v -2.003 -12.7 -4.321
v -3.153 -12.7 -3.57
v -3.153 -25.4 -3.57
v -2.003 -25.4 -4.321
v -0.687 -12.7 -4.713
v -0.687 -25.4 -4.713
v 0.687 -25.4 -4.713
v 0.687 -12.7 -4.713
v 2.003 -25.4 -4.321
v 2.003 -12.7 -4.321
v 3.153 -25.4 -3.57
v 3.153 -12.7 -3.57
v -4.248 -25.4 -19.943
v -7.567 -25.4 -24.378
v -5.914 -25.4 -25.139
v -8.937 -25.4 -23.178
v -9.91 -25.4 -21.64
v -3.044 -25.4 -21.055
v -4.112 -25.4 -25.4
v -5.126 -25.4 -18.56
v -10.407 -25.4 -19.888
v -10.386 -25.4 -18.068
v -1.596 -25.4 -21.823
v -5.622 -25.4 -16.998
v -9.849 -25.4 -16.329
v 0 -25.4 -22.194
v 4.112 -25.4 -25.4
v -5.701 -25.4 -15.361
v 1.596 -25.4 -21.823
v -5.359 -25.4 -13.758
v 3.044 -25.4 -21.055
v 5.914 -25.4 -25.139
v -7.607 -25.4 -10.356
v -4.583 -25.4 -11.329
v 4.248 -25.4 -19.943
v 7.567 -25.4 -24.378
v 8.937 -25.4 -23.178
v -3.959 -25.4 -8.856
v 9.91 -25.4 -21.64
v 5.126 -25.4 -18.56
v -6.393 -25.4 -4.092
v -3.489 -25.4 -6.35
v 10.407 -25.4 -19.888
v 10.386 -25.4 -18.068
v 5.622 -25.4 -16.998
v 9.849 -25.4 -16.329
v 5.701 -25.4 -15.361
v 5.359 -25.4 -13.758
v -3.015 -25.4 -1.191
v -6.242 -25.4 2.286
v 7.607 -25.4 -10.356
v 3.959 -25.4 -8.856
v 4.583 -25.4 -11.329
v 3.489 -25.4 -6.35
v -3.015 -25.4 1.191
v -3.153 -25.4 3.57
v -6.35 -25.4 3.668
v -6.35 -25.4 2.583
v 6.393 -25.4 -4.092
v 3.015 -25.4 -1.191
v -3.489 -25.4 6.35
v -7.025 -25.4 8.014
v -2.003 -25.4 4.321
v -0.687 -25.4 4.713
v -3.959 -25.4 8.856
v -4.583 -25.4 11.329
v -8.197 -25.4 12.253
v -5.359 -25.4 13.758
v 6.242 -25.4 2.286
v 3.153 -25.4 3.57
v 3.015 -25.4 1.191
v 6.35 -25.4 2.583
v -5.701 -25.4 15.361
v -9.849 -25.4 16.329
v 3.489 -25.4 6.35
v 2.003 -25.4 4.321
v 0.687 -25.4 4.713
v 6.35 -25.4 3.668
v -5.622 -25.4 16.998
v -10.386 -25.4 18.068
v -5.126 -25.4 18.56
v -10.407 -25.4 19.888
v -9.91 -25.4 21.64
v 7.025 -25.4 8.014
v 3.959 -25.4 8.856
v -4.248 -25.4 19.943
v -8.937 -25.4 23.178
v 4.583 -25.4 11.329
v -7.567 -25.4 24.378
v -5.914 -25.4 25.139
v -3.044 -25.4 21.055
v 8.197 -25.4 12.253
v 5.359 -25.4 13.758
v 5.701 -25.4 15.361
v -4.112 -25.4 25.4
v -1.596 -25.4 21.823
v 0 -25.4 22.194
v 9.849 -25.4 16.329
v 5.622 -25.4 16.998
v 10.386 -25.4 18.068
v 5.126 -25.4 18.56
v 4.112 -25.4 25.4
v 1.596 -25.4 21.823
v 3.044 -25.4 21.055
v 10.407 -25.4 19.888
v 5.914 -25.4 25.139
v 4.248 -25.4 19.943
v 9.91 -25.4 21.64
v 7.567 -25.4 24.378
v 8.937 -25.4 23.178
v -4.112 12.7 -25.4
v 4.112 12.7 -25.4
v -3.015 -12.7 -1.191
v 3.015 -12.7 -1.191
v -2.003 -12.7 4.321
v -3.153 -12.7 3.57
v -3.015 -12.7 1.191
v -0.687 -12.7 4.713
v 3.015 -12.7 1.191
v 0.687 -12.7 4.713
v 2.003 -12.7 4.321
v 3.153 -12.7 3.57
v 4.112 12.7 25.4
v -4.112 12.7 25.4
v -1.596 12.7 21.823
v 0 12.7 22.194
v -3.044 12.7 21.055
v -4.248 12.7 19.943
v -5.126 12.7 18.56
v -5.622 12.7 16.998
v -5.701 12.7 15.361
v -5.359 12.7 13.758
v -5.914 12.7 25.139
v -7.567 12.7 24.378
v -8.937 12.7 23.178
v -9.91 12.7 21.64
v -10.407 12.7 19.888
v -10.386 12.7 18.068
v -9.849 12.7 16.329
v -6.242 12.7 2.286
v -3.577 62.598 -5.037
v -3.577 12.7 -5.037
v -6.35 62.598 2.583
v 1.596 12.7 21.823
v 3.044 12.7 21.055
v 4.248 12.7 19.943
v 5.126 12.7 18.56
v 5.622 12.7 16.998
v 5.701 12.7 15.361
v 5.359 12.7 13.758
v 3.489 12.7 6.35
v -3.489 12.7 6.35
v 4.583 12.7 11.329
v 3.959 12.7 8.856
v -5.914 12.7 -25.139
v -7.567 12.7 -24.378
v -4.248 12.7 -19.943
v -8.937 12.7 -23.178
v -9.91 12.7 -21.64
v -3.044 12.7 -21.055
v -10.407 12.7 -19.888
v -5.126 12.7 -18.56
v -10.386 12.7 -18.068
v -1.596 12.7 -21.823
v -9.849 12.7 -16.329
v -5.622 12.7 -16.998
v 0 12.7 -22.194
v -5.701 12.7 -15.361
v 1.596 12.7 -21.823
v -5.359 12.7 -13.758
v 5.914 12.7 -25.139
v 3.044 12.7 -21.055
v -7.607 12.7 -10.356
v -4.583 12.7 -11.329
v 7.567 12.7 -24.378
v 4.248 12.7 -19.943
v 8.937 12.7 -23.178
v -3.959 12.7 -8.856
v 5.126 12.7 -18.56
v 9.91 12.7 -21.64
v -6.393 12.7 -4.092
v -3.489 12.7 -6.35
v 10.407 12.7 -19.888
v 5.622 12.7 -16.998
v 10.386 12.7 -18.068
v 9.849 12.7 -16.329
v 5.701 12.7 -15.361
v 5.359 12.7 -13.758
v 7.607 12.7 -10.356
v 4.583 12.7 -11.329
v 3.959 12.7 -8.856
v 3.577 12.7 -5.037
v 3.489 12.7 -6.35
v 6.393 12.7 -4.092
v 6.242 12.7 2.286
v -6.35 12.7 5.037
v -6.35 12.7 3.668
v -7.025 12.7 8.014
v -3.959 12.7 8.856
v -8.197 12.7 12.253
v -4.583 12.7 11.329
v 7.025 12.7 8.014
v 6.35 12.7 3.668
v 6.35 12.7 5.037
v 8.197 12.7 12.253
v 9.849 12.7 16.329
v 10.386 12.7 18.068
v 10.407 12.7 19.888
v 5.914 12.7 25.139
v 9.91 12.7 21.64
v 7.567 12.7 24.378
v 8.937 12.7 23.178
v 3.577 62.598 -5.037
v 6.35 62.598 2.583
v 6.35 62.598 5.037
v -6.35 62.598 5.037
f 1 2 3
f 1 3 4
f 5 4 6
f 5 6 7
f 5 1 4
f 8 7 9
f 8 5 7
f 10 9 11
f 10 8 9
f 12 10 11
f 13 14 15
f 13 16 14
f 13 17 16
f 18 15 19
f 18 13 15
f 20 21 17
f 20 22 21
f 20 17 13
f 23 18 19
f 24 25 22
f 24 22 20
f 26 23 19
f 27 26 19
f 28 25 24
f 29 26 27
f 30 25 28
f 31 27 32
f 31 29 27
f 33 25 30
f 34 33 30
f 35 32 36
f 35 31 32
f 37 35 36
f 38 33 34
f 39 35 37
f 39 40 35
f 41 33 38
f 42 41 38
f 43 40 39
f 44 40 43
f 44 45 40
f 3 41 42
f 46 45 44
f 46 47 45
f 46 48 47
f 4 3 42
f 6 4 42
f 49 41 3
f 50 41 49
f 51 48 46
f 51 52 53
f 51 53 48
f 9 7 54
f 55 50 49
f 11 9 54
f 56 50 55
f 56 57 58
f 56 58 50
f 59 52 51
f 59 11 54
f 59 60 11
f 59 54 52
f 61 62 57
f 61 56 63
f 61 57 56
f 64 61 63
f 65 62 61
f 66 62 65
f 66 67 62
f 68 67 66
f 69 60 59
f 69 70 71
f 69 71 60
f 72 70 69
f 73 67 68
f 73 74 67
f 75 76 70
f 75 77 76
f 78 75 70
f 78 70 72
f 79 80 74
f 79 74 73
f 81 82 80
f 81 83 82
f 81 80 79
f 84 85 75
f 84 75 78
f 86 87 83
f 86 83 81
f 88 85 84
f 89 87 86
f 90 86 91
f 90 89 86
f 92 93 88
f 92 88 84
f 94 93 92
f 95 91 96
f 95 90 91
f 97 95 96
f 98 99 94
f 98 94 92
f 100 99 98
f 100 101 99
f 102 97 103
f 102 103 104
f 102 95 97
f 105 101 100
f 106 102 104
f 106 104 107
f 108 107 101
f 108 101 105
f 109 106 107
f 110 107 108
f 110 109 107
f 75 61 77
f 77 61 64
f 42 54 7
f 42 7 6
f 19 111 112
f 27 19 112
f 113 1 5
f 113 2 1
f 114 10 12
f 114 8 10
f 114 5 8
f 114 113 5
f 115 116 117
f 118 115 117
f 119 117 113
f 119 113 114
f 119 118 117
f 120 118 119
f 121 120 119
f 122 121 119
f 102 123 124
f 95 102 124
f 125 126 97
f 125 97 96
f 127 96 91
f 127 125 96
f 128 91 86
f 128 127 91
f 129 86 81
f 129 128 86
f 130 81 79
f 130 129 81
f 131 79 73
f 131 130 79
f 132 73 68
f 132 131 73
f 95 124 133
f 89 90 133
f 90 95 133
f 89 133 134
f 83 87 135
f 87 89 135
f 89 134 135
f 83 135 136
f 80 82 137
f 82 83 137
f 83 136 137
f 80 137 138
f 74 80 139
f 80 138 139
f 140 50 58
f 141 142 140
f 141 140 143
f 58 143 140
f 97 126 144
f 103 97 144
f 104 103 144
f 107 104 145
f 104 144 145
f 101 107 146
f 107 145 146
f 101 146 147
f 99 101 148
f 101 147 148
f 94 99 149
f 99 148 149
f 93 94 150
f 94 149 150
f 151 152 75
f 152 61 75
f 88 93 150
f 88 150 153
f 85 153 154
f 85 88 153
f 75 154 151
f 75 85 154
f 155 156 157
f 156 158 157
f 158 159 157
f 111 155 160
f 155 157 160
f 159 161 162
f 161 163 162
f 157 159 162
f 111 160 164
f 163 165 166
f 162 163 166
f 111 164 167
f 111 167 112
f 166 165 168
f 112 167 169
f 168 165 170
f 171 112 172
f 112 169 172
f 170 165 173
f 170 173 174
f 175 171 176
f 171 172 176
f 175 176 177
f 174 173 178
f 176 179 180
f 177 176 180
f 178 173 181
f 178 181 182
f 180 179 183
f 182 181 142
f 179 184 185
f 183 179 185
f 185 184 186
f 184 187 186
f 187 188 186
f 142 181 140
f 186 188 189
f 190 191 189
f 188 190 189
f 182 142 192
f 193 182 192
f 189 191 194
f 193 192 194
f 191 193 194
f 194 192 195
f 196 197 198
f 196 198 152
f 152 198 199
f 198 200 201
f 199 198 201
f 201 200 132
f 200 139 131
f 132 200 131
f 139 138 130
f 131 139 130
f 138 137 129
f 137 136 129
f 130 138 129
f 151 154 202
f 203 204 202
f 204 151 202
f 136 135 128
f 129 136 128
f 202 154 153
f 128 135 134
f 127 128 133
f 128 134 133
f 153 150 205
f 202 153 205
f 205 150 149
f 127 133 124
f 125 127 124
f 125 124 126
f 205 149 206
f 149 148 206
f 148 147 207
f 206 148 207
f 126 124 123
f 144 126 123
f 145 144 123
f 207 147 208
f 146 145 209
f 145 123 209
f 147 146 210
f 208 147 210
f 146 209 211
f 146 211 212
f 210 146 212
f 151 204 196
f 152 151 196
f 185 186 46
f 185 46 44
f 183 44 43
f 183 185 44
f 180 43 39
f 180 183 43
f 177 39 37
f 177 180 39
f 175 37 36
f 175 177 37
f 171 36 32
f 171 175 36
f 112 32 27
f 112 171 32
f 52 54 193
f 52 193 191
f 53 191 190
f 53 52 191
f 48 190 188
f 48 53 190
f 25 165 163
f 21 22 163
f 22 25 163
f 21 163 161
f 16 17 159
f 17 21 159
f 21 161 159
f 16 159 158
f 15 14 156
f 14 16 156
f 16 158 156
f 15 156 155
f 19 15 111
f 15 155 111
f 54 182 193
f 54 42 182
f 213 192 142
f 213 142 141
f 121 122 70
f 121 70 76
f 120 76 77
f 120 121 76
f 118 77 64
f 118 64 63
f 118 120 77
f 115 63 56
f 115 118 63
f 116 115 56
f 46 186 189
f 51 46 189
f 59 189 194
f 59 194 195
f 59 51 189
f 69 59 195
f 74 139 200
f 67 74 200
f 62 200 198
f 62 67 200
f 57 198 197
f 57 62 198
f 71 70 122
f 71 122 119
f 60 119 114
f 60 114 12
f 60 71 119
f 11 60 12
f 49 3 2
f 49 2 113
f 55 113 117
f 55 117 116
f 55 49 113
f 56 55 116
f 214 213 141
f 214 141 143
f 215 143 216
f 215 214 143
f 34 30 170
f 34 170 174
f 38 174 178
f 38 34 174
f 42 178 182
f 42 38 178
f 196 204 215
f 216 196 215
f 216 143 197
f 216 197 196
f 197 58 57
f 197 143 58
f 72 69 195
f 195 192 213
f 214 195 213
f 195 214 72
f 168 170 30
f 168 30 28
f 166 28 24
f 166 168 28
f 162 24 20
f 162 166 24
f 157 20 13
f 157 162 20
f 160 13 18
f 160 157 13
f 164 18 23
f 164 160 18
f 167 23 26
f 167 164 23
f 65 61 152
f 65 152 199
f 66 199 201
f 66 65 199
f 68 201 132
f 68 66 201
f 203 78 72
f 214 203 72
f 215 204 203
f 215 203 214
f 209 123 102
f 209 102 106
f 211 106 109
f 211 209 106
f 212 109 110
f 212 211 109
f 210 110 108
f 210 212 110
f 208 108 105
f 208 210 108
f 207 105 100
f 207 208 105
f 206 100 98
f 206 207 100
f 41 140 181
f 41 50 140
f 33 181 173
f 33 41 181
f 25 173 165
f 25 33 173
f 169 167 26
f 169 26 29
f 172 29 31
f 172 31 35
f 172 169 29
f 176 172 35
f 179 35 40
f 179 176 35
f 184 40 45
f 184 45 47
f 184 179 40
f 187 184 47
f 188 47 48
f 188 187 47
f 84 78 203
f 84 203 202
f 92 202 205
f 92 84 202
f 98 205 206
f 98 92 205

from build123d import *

# Parameters (mm, degrees)
F1_DEPTH      = 25.4
F1_DEPTH_BACK = 12.7
F2_T1_DEPTH   = 38.1
F2_T3_DEPTH   = 96.9143148495
F3_W          = 12.7
F3_H          = 12.7
F3_R          = 4.7625
F4_DEPTH      = 25.4
F5_W          = 12.7
F5_H          = 12.7
F6_DEPTH      = 12.7
F6_DEPTH_BACK = 12.7
F7_W          = 63.5
F7_H          = 10.0732017308
F8_DEPTH      = 6.35
F9_SIZE2      = 2.7734531851
F9_SIZE       = 7.62
F9_2_SIZE2    = 2.7734531851
F9_2_SIZE     = 7.62


# Not quite as in the source:
# - a fillet or chamfer that OpenCascade refuses, or shapes differently, is made with other operations: its cross-section is extruded or revolved along the edge and cut away or added


with BuildPart() as f1:
    # F0 (on Front) → F1 (new body, two sides)
    with BuildSketch(Plane.XZ) as f1_sk:
        with BuildLine():
            Line((15.875, 25.4), (-15.875, 25.4))
            ThreePointArc((-15.875, 25.4), (-6.1730633142, 0), (-15.875, -25.4))
            Line((-15.875, -25.4), (15.875, -25.4))
            ThreePointArc((15.875, -25.4), (6.1730633142, 0), (15.875, 25.4))
        make_face()
        with BuildLine():
            ThreePointArc((-9.4926809127, -22.225), (-2.9980633142, 0), (-9.4926809127, 22.225))
            Line((-9.4926809127, 22.225), (9.4926809127, 22.225))
            ThreePointArc((9.4926809127, 22.225), (2.9980633142, 0), (9.4926809127, -22.225))
            Line((9.4926809127, -22.225), (-9.4926809127, -22.225))
        make_face(mode=Mode.SUBTRACT)
    extrude(amount=F1_DEPTH)
    extrude(f1_sk.sketch, amount=-F1_DEPTH_BACK)

    # F2: fillet of radius 6.35 on 8 edges, made by hand

    # F2_s2 → F2_t1 (join)
    with BuildSketch(Plane.XZ.offset(-12.7)):
        with BuildLine():
            ThreePointArc((-0.6282172911, 22.225), (4.5565359978, 19.5411742094), (5.3586201229, 13.7583333333))
            ThreePointArc((5.3586201229, 13.7583333333), (7.1832676704, 18.1100161264), (9.4926809127, 22.225))
            Line((9.4926809127, 22.225), (-0.6282172911, 22.225))
        make_face()
        with BuildLine():
            ThreePointArc((-0.6282172911, -22.225), (4.5565359978, -19.5411742094), (5.3586201229, -13.7583333333))
            ThreePointArc((5.3586201229, -13.7583333333), (7.1832676704, -18.1100161264), (9.4926809127, -22.225))
            Line((9.4926809127, -22.225), (-0.6282172911, -22.225))
        make_face()
        with BuildLine():
            ThreePointArc((0.6282172911, 22.225), (-4.5565359978, 19.5411742094), (-5.3586201229, 13.7583333333))
            ThreePointArc((-5.3586201229, 13.7583333333), (-7.1832676704, 18.1100161264), (-9.4926809127, 22.225))
            Line((-9.4926809127, 22.225), (0.6282172911, 22.225))
        make_face()
        with BuildLine():
            ThreePointArc((-5.3586201229, -13.7583333333), (-4.5565359978, -19.5411742094), (0.6282172911, -22.225))
            Line((0.6282172911, -22.225), (-9.4926809127, -22.225))
            ThreePointArc((-9.4926809127, -22.225), (-7.1832676704, -18.1100161264), (-5.3586201229, -13.7583333333))
        make_face()
    extrude(amount=F2_T1_DEPTH)

    # F2_s4 → F2_t3 (cut)
    with BuildSketch(Plane.XZ.offset(-42.1071574247)):
        with BuildLine():
            ThreePointArc((-4.1121370301, 25.4), (-9.4788665476, 22.4442177723), (-9.8494122136, 16.3285714286))
            ThreePointArc((-9.8494122136, 16.3285714286), (-12.5364180191, 21.0806865498), (-15.875, 25.4))
            Line((-15.875, 25.4), (-4.1121370301, 25.4))
        make_face()
        with BuildLine():
            ThreePointArc((-9.8494122136, -16.3285714286), (-9.4788665476, -22.4442177723), (-4.1121370301, -25.4))
            Line((-4.1121370301, -25.4), (-15.875, -25.4))
            ThreePointArc((-15.875, -25.4), (-12.5364180191, -21.0806865498), (-9.8494122136, -16.3285714286))
        make_face()
        with BuildLine():
            ThreePointArc((4.1121370301, 25.4), (9.4788665476, 22.4442177723), (9.8494122136, 16.3285714286))
            ThreePointArc((9.8494122136, 16.3285714286), (12.5364180191, 21.0806865498), (15.875, 25.4))
            Line((15.875, 25.4), (4.1121370301, 25.4))
        make_face()
        with BuildLine():
            ThreePointArc((9.8494122136, -16.3285714286), (9.4788665476, -22.4442177723), (4.1121370301, -25.4))
            Line((4.1121370301, -25.4), (15.875, -25.4))
            ThreePointArc((15.875, -25.4), (12.5364180191, -21.0806865498), (9.8494122136, -16.3285714286))
        make_face()
    extrude(amount=F2_T3_DEPTH, mode=Mode.SUBTRACT)

    # F3 (on Front) → F4 (join)
    with BuildSketch(Plane.XZ):
        Rectangle(F3_W, F3_H)
        Circle(F3_R, mode=Mode.SUBTRACT)
    extrude(amount=F4_DEPTH)

    # F5 (on Front) → F6 (join, two sides)
    with BuildSketch(Plane.XZ) as f6_sk:
        Rectangle(F5_W, F5_H)
    extrude(amount=-F6_DEPTH)
    extrude(f6_sk.sketch, amount=F6_DEPTH_BACK)

    # F7 (on Right) → F8 (join, symmetric)
    with BuildSketch(Plane.YZ):
        with Locations((30.847759068, 0)):
            Rectangle(F7_W, F7_H)
    extrude(amount=F8_DEPTH, both=True)

    # F9
    f9_edges = [f1.edges().sort_by_distance(p)[0] for p in [
        (6.35, 37.64888, -5.036601),
    ]]
    f9_side = f1.faces().sort_by_distance((6.35, 21.926607, 0))[0]
    chamfer(f9_edges, length=F9_SIZE, length2=F9_SIZE2, reference=f9_side)

    # F9#2
    f9_2_edges = [f1.edges().sort_by_distance(p)[0] for p in [
        (-6.35, 37.64888, -5.036601),
    ]]
    f9_2_side = f1.faces().sort_by_distance((-6.35, 21.926607, 0))[0]
    chamfer(f9_2_edges, length=F9_2_SIZE, length2=F9_2_SIZE2, reference=f9_2_side)


solid = f1.part
